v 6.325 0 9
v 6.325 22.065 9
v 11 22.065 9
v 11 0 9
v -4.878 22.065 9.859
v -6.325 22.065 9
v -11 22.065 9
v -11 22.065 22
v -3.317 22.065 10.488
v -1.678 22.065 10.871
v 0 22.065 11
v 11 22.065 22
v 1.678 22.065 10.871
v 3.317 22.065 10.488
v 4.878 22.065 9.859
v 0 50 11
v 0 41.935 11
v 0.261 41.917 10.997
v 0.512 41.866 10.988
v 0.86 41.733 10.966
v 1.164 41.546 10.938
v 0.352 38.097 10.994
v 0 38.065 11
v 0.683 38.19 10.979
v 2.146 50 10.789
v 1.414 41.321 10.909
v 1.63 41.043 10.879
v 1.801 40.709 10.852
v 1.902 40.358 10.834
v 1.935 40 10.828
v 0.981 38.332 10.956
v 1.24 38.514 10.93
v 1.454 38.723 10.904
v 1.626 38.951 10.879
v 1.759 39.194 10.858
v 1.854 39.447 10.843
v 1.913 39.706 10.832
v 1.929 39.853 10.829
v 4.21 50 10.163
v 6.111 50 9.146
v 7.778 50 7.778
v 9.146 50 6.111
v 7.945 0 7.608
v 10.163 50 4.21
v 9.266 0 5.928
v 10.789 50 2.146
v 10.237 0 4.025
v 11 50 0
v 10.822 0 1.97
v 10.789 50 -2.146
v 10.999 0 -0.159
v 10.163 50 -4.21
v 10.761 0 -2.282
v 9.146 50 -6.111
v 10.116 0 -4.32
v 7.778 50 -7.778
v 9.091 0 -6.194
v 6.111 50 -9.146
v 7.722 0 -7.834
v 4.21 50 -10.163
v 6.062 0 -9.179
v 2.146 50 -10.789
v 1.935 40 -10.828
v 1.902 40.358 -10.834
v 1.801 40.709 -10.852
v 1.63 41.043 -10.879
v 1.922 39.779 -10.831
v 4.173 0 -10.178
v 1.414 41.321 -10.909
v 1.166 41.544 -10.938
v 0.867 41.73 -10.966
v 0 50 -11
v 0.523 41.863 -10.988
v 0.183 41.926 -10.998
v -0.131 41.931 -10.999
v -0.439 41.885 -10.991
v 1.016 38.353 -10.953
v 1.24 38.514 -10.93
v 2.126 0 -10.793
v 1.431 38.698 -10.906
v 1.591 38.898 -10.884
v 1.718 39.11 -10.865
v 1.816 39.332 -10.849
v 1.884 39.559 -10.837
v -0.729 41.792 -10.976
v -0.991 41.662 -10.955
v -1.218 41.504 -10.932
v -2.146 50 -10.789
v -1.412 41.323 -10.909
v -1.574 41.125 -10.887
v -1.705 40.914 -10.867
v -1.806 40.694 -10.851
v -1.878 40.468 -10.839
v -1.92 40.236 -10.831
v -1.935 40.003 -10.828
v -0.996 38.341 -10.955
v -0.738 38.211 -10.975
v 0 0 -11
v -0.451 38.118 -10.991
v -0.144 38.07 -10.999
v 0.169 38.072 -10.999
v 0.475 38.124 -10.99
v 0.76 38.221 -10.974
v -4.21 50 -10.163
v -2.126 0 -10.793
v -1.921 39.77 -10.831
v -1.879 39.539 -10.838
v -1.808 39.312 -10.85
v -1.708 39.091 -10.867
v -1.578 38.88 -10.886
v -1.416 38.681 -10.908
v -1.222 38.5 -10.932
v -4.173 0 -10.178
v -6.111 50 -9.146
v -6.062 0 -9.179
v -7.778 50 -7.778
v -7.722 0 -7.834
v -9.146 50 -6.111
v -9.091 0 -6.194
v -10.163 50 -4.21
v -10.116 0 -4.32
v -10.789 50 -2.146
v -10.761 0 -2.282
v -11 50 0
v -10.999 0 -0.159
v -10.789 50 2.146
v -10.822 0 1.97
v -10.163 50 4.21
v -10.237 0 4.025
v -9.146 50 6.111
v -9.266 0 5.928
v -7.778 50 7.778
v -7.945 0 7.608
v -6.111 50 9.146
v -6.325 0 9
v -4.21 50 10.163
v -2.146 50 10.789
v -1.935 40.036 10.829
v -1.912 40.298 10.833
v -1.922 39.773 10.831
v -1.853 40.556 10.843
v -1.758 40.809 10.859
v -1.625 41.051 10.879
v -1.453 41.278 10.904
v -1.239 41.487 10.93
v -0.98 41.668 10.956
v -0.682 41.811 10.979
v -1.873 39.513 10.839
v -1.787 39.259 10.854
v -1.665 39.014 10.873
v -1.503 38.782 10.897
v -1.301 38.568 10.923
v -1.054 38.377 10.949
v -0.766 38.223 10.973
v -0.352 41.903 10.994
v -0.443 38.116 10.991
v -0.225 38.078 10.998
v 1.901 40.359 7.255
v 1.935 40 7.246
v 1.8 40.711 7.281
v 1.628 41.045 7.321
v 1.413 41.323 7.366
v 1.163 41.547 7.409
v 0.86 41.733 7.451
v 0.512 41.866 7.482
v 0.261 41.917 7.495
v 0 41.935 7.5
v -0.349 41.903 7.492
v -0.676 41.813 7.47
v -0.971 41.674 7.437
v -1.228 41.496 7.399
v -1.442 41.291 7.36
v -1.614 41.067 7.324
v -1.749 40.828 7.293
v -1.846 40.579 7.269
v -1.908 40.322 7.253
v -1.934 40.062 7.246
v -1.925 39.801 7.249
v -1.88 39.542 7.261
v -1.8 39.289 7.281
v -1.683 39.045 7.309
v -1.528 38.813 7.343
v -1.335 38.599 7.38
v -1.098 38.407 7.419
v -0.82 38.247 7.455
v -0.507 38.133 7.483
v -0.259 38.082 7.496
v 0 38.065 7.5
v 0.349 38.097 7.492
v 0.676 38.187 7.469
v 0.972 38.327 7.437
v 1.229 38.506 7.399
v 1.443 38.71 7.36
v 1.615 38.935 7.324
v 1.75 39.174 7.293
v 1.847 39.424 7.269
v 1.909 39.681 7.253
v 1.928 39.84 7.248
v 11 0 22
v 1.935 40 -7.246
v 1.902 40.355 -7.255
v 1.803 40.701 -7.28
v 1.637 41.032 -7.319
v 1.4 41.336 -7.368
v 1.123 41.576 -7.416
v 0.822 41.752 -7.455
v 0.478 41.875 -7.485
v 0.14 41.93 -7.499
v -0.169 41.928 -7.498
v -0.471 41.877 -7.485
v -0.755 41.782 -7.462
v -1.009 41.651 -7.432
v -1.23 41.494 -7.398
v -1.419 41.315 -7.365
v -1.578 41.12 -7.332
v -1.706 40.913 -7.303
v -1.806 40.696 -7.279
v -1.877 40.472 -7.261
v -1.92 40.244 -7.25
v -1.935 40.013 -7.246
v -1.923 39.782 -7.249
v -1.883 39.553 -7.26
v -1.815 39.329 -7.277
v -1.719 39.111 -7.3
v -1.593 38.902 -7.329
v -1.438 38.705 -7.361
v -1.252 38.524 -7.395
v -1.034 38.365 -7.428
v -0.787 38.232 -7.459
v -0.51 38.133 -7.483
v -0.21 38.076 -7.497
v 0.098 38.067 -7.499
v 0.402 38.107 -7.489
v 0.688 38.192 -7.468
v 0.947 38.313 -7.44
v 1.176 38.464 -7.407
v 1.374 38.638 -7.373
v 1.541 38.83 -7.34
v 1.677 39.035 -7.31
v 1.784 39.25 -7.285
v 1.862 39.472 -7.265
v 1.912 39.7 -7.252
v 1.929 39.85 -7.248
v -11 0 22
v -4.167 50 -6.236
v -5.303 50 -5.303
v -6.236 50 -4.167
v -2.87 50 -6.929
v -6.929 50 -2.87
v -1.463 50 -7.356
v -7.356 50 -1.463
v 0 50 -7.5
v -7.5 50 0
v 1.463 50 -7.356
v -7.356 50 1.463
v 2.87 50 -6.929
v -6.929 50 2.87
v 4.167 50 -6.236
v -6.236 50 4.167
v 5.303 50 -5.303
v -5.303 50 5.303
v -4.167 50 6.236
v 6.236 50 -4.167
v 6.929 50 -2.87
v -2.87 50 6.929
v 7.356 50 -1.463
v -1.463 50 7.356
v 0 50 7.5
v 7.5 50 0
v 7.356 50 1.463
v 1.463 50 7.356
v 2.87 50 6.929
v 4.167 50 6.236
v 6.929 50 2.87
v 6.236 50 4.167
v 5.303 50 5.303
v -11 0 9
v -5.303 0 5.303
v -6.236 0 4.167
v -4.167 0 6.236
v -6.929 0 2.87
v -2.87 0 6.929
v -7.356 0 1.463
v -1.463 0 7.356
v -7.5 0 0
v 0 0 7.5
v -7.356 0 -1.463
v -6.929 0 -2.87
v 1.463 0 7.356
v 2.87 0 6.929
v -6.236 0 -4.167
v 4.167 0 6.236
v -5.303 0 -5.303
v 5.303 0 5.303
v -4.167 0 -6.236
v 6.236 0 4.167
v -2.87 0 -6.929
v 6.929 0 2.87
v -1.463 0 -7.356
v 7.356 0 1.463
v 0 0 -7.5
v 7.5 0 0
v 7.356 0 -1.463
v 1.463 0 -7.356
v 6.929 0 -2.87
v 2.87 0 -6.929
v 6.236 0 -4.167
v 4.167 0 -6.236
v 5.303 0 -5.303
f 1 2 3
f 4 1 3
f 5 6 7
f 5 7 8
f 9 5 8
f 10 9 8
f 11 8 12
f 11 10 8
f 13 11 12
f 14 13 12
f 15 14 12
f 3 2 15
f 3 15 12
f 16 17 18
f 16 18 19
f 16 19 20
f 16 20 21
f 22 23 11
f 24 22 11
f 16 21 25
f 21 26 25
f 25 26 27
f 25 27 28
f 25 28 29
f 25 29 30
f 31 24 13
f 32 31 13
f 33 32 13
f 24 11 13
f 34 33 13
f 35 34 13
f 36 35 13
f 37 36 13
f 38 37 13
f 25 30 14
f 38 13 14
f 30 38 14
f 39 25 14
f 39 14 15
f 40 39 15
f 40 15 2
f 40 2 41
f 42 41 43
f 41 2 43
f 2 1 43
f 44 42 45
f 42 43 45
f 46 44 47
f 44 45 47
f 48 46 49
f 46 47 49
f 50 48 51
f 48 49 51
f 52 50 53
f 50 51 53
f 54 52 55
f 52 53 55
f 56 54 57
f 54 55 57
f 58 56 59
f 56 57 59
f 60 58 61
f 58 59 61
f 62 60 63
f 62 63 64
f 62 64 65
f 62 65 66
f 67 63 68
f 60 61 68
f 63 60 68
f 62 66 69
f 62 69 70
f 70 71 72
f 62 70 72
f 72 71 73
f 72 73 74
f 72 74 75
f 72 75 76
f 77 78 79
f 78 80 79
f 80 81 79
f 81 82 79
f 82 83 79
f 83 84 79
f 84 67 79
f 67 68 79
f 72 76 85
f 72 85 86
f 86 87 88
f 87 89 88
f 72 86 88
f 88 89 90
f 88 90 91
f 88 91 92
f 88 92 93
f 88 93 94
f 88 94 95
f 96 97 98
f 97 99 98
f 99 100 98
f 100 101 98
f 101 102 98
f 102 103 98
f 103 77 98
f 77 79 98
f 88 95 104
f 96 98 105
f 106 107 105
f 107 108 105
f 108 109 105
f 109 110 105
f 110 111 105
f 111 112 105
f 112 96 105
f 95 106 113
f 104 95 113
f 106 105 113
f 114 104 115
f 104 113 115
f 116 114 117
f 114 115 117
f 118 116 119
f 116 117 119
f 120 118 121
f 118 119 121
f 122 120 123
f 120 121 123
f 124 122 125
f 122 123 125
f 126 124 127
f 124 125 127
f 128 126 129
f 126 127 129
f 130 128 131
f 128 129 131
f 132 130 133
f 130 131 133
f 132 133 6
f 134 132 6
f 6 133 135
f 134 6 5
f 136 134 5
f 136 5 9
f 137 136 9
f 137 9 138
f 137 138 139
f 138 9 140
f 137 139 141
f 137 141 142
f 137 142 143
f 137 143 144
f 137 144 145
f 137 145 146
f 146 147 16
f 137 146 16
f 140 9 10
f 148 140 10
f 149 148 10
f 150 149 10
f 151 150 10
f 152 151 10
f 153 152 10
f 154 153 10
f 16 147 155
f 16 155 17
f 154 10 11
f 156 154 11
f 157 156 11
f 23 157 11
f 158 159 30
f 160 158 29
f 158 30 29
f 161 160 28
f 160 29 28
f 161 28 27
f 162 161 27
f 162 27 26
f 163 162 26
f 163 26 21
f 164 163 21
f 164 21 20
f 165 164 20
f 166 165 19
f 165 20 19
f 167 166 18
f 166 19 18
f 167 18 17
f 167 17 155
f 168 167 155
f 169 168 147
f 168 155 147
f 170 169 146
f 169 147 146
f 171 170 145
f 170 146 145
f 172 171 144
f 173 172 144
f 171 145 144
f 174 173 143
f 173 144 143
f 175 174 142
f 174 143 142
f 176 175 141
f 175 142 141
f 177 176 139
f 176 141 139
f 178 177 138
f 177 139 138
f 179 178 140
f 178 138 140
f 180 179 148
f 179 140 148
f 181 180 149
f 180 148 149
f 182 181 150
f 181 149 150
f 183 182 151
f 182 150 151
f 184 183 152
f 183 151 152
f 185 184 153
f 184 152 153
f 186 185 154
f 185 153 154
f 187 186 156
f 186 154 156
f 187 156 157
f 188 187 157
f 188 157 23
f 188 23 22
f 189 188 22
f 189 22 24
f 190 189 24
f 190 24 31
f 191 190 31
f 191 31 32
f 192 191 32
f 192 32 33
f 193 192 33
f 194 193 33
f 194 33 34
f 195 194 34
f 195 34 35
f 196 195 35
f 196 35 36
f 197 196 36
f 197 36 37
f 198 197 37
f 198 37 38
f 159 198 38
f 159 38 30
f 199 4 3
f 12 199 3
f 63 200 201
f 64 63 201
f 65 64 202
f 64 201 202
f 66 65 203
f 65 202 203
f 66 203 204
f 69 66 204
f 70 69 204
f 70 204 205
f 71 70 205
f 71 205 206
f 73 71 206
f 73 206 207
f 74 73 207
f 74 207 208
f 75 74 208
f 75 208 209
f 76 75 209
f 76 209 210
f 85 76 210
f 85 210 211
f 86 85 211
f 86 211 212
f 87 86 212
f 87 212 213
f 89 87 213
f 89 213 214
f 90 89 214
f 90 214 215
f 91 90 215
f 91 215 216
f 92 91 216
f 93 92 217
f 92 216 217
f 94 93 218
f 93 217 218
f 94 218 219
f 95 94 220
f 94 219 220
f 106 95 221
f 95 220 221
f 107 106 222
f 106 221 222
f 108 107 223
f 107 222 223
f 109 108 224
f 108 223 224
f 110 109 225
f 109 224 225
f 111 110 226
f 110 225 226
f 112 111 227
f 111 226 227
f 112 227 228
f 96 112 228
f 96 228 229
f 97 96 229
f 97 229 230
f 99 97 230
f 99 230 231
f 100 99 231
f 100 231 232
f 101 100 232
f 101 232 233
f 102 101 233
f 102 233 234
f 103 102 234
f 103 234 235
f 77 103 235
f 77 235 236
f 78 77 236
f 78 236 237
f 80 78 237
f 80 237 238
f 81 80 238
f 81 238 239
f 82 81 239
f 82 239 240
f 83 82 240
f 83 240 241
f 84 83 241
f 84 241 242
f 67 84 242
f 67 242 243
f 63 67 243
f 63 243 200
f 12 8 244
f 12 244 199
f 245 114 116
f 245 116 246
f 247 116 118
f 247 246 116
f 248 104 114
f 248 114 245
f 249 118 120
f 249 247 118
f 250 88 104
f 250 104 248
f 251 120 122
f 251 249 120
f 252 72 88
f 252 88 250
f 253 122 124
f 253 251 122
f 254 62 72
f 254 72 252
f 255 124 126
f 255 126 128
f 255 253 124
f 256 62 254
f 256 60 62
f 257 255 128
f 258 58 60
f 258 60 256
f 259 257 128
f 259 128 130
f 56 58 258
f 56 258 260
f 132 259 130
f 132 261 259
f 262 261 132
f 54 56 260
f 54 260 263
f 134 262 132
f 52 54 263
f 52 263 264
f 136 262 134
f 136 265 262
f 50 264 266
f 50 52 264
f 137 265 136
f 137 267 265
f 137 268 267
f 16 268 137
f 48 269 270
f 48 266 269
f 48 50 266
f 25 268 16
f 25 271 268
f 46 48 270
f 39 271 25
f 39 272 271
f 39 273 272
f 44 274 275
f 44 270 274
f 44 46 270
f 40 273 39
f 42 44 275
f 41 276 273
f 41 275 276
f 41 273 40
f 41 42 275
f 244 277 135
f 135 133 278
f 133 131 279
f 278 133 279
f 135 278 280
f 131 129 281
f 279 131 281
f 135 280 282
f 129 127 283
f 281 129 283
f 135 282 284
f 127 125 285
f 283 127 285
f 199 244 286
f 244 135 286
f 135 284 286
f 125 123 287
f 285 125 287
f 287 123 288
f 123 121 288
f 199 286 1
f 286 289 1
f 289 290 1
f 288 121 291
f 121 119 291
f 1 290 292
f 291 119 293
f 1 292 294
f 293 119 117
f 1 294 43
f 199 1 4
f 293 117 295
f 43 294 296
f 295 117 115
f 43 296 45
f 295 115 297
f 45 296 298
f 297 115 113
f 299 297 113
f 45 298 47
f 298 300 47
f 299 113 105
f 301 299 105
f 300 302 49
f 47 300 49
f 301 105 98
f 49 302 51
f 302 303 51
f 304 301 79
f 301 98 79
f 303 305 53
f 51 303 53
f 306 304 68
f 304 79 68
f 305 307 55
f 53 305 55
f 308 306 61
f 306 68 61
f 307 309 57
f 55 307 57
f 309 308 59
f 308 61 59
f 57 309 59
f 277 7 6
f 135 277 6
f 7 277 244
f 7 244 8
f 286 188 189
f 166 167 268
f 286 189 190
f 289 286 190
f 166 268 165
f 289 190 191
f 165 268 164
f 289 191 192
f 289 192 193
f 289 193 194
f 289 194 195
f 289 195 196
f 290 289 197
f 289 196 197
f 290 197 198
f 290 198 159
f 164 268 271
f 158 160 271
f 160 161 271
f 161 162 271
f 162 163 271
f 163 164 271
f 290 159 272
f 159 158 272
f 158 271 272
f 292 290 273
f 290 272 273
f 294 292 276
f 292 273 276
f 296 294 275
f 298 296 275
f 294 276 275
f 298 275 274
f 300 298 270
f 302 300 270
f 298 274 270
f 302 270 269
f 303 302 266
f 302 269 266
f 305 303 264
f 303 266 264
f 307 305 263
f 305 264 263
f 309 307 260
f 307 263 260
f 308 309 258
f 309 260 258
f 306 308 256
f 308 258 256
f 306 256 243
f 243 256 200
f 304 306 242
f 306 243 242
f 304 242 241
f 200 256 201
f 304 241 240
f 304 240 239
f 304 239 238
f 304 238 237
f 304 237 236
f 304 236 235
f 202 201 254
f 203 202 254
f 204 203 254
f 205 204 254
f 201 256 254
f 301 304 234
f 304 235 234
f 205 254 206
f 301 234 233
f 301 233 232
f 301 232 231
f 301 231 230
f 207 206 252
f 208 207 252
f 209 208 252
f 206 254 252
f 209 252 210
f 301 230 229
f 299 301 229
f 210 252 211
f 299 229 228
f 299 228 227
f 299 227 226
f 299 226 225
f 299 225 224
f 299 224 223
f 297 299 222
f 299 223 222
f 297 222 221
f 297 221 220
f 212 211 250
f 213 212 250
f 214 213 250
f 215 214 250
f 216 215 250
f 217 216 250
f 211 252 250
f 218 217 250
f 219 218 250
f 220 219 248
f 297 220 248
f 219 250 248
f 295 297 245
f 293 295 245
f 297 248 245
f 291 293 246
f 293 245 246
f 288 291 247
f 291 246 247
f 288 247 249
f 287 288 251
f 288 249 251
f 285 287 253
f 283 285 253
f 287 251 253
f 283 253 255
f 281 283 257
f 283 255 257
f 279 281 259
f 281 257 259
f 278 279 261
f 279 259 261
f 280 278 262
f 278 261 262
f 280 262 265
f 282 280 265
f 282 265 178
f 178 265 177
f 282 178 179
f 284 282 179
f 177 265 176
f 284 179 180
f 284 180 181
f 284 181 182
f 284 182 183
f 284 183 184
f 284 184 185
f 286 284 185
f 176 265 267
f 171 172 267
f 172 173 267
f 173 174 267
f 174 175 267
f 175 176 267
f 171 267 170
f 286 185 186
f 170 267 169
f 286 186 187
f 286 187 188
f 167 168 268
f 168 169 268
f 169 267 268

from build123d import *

# Parameters (mm, degrees)
SKETCH_1_R           = 11
EXTRUDE_1_DEPTH      = 50
SKETCH_2_R           = 7.5
CUT_EXTRUDE_1_DEPTH  = 53.364109846
SKETCH_4_R           = 1.935
CUT_EXTRUDE_4_DEPTH  = 50
EXTRUDE_3_DEPTH      = 10
EXTRUDE_3_DEPTH_BACK = 3
SKETCH_11_W          = 22
SKETCH_11_H          = 22.065


with BuildPart() as part:
    # 草圖1 → 填料-伸長1 (new body)
    with BuildSketch(Plane(origin=(0, 0, 0), x_dir=(1, 0, 0), z_dir=(0, 1, 0))):
        with Locations(Location((0, 0, 0), (0, 0, 270))):
            Circle(SKETCH_1_R)
    extrude(amount=EXTRUDE_1_DEPTH)

    # 草圖2 → 除料-伸長1 (cut, through all)
    with BuildSketch(Plane(origin=(0, 50, 0), x_dir=(1, 0, 0), z_dir=(0, 1, 0))):
        with Locations(Location((0, 0, 0), (0, 0, 270))):
            Circle(SKETCH_2_R)
    extrude(amount=-CUT_EXTRUDE_1_DEPTH, mode=Mode.SUBTRACT)

    # 草圖4 → 除料-伸長4 (cut)
    with BuildSketch(Plane.XY.offset(12)):
        with Locations((0, 40)):
            Circle(SKETCH_4_R)
    extrude(amount=-CUT_EXTRUDE_4_DEPTH, mode=Mode.SUBTRACT)

    # 草圖11 → 填料-伸長3 (add, two sides: drawn at the far end of the back side and taken through both)
    with BuildSketch(Plane.XY.offset(12).offset(-EXTRUDE_3_DEPTH_BACK)):
        with Locations((0, 11.0325)):
            Rectangle(SKETCH_11_W, SKETCH_11_H)
    extrude(amount=EXTRUDE_3_DEPTH + EXTRUDE_3_DEPTH_BACK)


solid = part.part
